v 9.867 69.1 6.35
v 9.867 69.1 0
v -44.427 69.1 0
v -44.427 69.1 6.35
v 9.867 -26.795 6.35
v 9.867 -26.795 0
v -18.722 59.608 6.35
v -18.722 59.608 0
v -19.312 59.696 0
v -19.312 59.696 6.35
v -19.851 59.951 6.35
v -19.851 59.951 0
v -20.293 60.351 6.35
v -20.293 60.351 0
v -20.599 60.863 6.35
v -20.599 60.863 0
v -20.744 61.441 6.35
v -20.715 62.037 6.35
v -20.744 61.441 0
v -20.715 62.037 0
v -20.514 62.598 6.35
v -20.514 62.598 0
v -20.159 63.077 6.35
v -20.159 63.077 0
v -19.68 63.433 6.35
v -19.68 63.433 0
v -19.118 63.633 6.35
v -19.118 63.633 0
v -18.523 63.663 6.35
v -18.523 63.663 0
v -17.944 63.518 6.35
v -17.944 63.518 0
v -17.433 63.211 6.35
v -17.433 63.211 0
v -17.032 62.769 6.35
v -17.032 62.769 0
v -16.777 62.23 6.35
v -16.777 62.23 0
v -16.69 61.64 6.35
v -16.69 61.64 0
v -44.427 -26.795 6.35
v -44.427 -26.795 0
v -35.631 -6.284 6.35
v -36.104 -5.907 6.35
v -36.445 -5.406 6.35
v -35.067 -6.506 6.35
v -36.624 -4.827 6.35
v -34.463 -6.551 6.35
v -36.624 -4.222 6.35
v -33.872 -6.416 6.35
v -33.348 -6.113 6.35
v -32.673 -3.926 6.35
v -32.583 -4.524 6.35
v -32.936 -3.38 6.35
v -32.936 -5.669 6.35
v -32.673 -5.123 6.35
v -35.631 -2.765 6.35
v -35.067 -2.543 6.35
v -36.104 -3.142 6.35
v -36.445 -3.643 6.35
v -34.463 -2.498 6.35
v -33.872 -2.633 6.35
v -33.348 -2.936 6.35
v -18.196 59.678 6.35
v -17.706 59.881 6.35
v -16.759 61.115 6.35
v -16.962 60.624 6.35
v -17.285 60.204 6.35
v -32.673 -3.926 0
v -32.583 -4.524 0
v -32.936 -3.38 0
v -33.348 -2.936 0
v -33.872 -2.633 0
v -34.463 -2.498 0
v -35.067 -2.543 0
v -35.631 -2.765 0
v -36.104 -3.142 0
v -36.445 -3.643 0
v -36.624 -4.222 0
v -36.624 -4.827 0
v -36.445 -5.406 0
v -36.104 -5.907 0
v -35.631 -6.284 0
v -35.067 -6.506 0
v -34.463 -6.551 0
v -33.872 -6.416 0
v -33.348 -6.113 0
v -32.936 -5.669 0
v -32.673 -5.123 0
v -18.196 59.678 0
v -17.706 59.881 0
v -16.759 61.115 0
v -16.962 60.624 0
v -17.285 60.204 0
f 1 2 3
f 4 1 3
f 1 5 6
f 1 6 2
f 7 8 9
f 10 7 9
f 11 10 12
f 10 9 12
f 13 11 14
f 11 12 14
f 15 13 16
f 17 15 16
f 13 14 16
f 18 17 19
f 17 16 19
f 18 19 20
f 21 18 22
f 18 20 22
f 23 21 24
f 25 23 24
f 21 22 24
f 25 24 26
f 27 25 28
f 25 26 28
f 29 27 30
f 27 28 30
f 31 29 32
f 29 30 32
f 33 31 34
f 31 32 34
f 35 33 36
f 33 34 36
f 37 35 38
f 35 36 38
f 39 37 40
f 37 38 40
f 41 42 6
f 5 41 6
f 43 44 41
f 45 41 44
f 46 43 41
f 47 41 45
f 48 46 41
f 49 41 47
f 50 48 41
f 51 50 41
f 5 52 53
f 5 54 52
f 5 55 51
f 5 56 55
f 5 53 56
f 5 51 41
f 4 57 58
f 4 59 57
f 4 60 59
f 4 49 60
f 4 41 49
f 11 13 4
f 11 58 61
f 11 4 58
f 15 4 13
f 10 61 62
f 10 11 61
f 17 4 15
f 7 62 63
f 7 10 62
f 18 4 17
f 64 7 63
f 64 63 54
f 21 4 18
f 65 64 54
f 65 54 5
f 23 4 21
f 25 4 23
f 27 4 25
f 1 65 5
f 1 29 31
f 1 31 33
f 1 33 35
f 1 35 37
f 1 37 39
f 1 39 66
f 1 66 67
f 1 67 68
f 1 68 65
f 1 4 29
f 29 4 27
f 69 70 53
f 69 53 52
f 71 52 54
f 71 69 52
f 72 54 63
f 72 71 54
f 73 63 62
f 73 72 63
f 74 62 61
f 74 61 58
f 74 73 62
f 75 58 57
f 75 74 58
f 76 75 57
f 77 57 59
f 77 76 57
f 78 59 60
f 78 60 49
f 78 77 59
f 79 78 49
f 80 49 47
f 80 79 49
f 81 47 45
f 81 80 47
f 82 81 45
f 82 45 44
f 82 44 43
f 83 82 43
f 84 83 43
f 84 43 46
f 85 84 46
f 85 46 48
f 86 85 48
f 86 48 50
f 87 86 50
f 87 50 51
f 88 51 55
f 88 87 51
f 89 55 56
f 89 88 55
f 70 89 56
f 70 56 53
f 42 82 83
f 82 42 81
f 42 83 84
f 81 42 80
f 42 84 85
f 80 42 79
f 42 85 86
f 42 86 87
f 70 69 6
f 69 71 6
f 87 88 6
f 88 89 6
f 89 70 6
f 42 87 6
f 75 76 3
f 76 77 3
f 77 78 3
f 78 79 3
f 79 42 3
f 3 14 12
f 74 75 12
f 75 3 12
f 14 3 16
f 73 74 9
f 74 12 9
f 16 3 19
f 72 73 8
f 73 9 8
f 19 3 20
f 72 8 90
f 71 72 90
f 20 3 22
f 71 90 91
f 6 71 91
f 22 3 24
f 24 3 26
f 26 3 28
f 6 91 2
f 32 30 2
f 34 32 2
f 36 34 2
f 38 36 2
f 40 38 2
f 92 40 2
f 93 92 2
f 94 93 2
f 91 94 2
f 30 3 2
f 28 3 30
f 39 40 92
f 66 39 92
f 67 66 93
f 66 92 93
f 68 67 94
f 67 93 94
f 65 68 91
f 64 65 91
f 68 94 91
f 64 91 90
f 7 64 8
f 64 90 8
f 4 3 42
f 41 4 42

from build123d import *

# Parameters (mm, degrees)
F0_W        = 20.9599784
F0_H        = 42.260012
F0_R        = 2.032
F1_DEPTH    = 6.35
F2_W        = 32.0040006191
F2_H        = 57.15
F2_W_2      = 20.9599784
F2_H_2      = 42.260012
F3_DEPTH    = 12.7
F4_W        = 54.2940877291
F4_H        = 95.895376205
F4_W_2      = 32.0040006191
F4_H_2      = 57.15
F4_R        = 2.032
F3_FACE_W   = 32.0040006191
F3_FACE_H   = 57.15
F3_FACE_W_2 = 20.9599784
F3_FACE_H_2 = 42.260012
F5_DEPTH    = 25.4


with BuildPart() as f1:
    # F0 (on Top) → F1 (new body)
    with BuildSketch(Plane.XY):
        Polygon((64.1610962078, 69.1004172512), (36.6851288078, 69.1004172512), (9.8670084787, 69.1004172512), (9.8670084787, 61.6404372512), (9.8670084787, -26.7949589538), (64.1610962078, -26.7949589538), align=None)
        with Locations((47.1651180078, 4.2184540512)):
            Rectangle(F0_W, F0_H, mode=Mode.SUBTRACT)
        with BuildLine():
            ThreePointArc((34.2246816078, 61.6404372512), (32.1926816078, 59.6084372512), (30.1606816078, 61.6404372512))
            ThreePointArc((30.1606816078, 61.6404372512), (32.1926816078, 63.6724372512), (34.2246816078, 61.6404372512))
        make_face(mode=Mode.SUBTRACT)
        with BuildLine():
            Line((9.8670084787, 61.6404372512), (9.8670084787, 69.1004172512))
            Line((9.8670084787, 69.1004172512), (-44.4270792504, 69.1004172512))
            Line((-44.4270792504, 69.1004172512), (-44.4270792504, -26.7949589538))
            Line((-44.4270792504, -26.7949589538), (-18.7219286708, -26.7949589538))
            Line((-18.7219286708, -26.7949589538), (-18.7219286708, 59.6084372512))
            ThreePointArc((-18.7219286708, 59.6084372512), (-20.1587696502, 63.0772782306), (-16.6899286708, 61.6404372512))
            Line((-16.6899286708, 61.6404372512), (9.8670084787, 61.6404372512))
        make_face()
        with Locations((-34.6146070708, -4.524490289)):
            Circle(F0_R, mode=Mode.SUBTRACT)
        with BuildLine():
            Line((9.8670084787, -26.7949589538), (9.8670084787, 61.6404372512))
            Line((9.8670084787, 61.6404372512), (-16.6899286708, 61.6404372512))
            ThreePointArc((-16.6899286708, 61.6404372512), (-17.2850876915, 60.2035962718), (-18.7219286708, 59.6084372512))
            Line((-18.7219286708, 59.6084372512), (-18.7219286708, -26.7949589538))
            Line((-18.7219286708, -26.7949589538), (9.8670084787, -26.7949589538))
        make_face()
    extrude(amount=F1_DEPTH)

    # F2 (on face) → F3 (join)
    with BuildSketch(Plane.XY.offset(6.35)):
        with Locations((47.0991291173, 4.2974480512)):
            Rectangle(F2_W, F2_H)
        with Locations((47.1651180078, 4.2184540512)):
            Rectangle(F2_W_2, F2_H_2, mode=Mode.SUBTRACT)
    extrude(amount=F3_DEPTH)

    # F4 (on face) + F3_face (on face) → F5 (cut)
    with BuildSketch(Plane.XY.offset(6.35)):
        with Locations((37.0140523432, 21.1527291487)):
            Rectangle(F4_W, F4_H)
        with Locations((47.0991291173, 4.2974480512)):
            Rectangle(F4_W_2, F4_H_2, mode=Mode.SUBTRACT)
        with Locations((32.1926816078, 61.6404372512)):
            Circle(F4_R, mode=Mode.SUBTRACT)
    with BuildSketch(Plane(origin=(47.0371621853, 4.371627444, 19.05), x_dir=(1, 0, 0), z_dir=(0, 0, 1))):
        with Locations((0.061966932, -0.0741793928)):
            Rectangle(F3_FACE_W, F3_FACE_H)
        with Locations((0.1279558225, -0.1531733928)):
            Rectangle(F3_FACE_W_2, F3_FACE_H_2, mode=Mode.SUBTRACT)
    extrude(amount=-F5_DEPTH, mode=Mode.SUBTRACT)


solid = f1.part
